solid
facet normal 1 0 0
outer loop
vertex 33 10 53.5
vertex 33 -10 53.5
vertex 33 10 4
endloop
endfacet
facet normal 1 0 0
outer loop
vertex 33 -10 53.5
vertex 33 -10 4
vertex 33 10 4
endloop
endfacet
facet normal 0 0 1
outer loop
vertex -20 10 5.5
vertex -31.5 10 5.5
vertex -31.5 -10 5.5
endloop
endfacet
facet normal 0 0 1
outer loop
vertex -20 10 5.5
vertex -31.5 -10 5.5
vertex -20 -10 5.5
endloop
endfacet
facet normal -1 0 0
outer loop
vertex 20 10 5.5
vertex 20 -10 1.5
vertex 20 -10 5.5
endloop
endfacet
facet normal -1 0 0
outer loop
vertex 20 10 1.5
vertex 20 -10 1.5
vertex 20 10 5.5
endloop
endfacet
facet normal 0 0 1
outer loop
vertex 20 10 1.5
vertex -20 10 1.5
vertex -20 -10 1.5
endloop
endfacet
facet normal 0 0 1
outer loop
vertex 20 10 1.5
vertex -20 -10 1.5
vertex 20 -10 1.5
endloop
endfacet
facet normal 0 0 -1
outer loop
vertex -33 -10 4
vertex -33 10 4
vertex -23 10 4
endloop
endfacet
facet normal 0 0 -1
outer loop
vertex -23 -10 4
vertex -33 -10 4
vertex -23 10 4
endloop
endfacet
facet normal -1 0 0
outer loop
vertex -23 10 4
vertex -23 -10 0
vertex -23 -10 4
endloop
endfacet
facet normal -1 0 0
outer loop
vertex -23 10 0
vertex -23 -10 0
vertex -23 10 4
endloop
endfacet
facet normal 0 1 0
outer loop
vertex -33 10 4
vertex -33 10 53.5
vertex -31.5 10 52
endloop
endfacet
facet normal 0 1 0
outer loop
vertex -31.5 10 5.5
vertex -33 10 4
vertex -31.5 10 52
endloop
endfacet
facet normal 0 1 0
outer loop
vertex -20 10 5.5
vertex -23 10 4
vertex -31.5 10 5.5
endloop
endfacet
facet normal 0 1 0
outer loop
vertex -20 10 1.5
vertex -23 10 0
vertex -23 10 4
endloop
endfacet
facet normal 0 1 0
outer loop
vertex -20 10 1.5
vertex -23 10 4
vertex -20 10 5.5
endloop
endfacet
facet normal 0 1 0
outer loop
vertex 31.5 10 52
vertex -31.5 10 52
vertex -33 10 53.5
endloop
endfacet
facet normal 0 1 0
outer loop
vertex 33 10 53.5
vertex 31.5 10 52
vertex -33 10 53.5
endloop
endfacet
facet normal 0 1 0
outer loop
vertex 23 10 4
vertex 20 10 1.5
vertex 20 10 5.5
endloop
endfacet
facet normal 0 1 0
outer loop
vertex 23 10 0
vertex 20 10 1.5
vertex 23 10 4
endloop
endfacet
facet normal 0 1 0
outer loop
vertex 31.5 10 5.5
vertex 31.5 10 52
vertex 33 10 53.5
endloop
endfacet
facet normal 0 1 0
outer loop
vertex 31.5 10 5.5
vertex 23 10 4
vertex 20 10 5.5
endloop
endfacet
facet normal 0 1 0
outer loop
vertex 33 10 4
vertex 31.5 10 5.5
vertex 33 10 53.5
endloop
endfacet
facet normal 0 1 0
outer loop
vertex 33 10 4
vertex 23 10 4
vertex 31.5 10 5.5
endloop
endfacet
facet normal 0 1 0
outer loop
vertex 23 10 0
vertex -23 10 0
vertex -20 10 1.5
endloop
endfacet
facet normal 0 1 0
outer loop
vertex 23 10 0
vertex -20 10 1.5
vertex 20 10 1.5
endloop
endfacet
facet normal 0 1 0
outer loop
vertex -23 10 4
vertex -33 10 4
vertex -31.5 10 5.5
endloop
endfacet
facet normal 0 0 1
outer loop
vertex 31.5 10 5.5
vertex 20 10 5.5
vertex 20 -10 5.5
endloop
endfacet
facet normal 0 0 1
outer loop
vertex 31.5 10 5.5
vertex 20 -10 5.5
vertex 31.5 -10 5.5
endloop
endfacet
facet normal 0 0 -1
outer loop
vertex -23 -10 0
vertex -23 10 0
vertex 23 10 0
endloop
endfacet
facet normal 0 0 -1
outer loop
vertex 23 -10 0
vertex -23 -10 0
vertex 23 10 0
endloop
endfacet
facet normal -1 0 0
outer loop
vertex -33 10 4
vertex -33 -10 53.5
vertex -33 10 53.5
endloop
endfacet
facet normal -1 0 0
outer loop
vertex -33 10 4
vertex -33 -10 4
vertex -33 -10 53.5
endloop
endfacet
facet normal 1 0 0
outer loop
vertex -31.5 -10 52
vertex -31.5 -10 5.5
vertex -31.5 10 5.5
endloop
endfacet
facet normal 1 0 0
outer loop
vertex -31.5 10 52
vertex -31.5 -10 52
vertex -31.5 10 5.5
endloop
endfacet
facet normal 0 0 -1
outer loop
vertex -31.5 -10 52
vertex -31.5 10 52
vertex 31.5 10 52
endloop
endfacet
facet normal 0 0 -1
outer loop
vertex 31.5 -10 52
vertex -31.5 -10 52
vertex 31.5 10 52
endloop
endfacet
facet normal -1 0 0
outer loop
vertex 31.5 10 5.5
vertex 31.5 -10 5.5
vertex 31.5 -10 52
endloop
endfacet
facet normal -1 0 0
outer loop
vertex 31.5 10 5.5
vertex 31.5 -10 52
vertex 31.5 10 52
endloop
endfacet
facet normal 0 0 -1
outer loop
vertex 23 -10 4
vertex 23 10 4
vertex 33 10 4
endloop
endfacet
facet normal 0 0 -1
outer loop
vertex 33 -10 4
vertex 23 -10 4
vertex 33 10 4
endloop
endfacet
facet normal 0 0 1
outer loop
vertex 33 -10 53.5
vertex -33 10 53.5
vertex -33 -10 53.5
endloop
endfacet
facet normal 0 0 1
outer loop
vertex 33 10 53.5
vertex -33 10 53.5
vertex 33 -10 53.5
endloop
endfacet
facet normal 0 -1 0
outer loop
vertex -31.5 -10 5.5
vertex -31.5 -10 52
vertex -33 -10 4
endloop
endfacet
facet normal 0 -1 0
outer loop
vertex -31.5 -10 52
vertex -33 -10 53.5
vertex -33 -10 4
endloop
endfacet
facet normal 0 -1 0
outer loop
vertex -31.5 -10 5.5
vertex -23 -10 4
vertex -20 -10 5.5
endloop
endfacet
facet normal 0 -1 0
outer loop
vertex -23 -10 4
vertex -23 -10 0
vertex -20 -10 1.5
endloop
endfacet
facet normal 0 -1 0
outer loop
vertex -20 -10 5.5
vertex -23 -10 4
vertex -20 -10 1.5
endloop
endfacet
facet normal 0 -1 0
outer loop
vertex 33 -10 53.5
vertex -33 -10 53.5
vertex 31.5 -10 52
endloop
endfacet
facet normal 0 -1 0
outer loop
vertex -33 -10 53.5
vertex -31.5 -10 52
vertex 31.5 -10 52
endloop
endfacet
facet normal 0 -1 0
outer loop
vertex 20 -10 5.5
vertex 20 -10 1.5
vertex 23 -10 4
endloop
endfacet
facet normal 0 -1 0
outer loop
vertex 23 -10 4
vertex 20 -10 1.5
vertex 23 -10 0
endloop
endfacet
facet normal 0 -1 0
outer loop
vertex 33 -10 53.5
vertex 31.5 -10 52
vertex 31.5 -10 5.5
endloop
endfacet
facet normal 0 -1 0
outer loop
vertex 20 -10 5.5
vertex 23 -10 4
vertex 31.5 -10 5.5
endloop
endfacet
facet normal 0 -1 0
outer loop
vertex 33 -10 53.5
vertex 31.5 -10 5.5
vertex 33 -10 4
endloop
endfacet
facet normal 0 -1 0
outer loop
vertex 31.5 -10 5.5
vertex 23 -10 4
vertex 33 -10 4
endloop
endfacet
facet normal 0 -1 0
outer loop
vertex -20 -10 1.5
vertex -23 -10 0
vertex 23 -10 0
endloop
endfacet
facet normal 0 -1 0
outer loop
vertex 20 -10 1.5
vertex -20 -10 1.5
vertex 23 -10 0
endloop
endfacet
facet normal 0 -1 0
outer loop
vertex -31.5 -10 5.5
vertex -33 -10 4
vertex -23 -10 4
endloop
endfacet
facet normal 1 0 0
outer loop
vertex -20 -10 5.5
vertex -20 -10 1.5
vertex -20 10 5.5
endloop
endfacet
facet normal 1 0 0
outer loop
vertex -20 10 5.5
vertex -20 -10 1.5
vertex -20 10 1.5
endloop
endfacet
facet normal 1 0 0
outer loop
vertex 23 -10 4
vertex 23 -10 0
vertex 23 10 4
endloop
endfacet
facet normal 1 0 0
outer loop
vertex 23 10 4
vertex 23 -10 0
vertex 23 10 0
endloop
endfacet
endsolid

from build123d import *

# Parameters (mm, degrees)
SKETCH_4_W        = 44
SKETCH_4_H        = 20
EXTRUDE_282_DEPTH = 1.5
SKETCH_5_W        = 3
SKETCH_5_H        = 20
EXTRUDE_1_DEPTH   = 5.5
EXTRUDE_START     = 4
SKETCH_6_W        = 12
SKETCH_6_H        = 20
EXTRUDE_1_2_DEPTH = 1.5
SKETCH_7_W        = 1.5
SKETCH_7_H        = 20
EXTRUDE_1_3_DEPTH = 48
SKETCH_8_W        = 3
SKETCH_8_H        = 20
EXTRUDE_1_4_DEPTH = 5.5
SKETCH_9_W        = 12
SKETCH_9_H        = 20
EXTRUDE_1_5_DEPTH = 1.5
SKETCH_10_W       = 1.5
SKETCH_10_H       = 20
EXTRUDE_1_6_DEPTH = 48
EXTRUDE_START_2   = 52
SKETCH_11_W       = 66
SKETCH_11_H       = 20
EXTRUDE_763_DEPTH = 1.5


with BuildPart() as part:
    # 草图4 → Extrude 282 (new body)
    with BuildSketch(Plane.XY):
        Rectangle(SKETCH_4_W, SKETCH_4_H)
    extrude(amount=EXTRUDE_282_DEPTH)

    # 草图5 → Extrude 1 (add)
    with BuildSketch(Plane.XY):
        with Locations((-21.5, 0)):
            Rectangle(SKETCH_5_W, SKETCH_5_H)
    extrude(amount=EXTRUDE_1_DEPTH)

    # 草图6 → Extrude 1 2 (add)
    with BuildSketch(Plane.XY.offset(EXTRUDE_START)):
        with Locations((-27, 0)):
            Rectangle(SKETCH_6_W, SKETCH_6_H)
    extrude(amount=EXTRUDE_1_2_DEPTH)

    # 草图7 → Extrude 1 3 (add)
    with BuildSketch(Plane.XY.offset(EXTRUDE_START)):
        with Locations((-32.25, 0)):
            Rectangle(SKETCH_7_W, SKETCH_7_H)
    extrude(amount=EXTRUDE_1_3_DEPTH)

    # 草图8 → Extrude 1 4 (add)
    with BuildSketch(Plane.XY):
        with Locations((21.5, 0)):
            Rectangle(SKETCH_8_W, SKETCH_8_H)
    extrude(amount=EXTRUDE_1_4_DEPTH)

    # 草图9 → Extrude 1 5 (add)
    with BuildSketch(Plane.XY.offset(EXTRUDE_START)):
        with Locations((27, 0)):
            Rectangle(SKETCH_9_W, SKETCH_9_H)
    extrude(amount=EXTRUDE_1_5_DEPTH)

    # 草图10 → Extrude 1 6 (add)
    with BuildSketch(Plane.XY.offset(EXTRUDE_START)):
        with Locations((32.25, 0)):
            Rectangle(SKETCH_10_W, SKETCH_10_H)
    extrude(amount=EXTRUDE_1_6_DEPTH)

    # 草图11 → Extrude 763 (add)
    with BuildSketch(Plane.XY.offset(EXTRUDE_START_2)):
        Rectangle(SKETCH_11_W, SKETCH_11_H)
    extrude(amount=EXTRUDE_763_DEPTH)


solid = part.part
